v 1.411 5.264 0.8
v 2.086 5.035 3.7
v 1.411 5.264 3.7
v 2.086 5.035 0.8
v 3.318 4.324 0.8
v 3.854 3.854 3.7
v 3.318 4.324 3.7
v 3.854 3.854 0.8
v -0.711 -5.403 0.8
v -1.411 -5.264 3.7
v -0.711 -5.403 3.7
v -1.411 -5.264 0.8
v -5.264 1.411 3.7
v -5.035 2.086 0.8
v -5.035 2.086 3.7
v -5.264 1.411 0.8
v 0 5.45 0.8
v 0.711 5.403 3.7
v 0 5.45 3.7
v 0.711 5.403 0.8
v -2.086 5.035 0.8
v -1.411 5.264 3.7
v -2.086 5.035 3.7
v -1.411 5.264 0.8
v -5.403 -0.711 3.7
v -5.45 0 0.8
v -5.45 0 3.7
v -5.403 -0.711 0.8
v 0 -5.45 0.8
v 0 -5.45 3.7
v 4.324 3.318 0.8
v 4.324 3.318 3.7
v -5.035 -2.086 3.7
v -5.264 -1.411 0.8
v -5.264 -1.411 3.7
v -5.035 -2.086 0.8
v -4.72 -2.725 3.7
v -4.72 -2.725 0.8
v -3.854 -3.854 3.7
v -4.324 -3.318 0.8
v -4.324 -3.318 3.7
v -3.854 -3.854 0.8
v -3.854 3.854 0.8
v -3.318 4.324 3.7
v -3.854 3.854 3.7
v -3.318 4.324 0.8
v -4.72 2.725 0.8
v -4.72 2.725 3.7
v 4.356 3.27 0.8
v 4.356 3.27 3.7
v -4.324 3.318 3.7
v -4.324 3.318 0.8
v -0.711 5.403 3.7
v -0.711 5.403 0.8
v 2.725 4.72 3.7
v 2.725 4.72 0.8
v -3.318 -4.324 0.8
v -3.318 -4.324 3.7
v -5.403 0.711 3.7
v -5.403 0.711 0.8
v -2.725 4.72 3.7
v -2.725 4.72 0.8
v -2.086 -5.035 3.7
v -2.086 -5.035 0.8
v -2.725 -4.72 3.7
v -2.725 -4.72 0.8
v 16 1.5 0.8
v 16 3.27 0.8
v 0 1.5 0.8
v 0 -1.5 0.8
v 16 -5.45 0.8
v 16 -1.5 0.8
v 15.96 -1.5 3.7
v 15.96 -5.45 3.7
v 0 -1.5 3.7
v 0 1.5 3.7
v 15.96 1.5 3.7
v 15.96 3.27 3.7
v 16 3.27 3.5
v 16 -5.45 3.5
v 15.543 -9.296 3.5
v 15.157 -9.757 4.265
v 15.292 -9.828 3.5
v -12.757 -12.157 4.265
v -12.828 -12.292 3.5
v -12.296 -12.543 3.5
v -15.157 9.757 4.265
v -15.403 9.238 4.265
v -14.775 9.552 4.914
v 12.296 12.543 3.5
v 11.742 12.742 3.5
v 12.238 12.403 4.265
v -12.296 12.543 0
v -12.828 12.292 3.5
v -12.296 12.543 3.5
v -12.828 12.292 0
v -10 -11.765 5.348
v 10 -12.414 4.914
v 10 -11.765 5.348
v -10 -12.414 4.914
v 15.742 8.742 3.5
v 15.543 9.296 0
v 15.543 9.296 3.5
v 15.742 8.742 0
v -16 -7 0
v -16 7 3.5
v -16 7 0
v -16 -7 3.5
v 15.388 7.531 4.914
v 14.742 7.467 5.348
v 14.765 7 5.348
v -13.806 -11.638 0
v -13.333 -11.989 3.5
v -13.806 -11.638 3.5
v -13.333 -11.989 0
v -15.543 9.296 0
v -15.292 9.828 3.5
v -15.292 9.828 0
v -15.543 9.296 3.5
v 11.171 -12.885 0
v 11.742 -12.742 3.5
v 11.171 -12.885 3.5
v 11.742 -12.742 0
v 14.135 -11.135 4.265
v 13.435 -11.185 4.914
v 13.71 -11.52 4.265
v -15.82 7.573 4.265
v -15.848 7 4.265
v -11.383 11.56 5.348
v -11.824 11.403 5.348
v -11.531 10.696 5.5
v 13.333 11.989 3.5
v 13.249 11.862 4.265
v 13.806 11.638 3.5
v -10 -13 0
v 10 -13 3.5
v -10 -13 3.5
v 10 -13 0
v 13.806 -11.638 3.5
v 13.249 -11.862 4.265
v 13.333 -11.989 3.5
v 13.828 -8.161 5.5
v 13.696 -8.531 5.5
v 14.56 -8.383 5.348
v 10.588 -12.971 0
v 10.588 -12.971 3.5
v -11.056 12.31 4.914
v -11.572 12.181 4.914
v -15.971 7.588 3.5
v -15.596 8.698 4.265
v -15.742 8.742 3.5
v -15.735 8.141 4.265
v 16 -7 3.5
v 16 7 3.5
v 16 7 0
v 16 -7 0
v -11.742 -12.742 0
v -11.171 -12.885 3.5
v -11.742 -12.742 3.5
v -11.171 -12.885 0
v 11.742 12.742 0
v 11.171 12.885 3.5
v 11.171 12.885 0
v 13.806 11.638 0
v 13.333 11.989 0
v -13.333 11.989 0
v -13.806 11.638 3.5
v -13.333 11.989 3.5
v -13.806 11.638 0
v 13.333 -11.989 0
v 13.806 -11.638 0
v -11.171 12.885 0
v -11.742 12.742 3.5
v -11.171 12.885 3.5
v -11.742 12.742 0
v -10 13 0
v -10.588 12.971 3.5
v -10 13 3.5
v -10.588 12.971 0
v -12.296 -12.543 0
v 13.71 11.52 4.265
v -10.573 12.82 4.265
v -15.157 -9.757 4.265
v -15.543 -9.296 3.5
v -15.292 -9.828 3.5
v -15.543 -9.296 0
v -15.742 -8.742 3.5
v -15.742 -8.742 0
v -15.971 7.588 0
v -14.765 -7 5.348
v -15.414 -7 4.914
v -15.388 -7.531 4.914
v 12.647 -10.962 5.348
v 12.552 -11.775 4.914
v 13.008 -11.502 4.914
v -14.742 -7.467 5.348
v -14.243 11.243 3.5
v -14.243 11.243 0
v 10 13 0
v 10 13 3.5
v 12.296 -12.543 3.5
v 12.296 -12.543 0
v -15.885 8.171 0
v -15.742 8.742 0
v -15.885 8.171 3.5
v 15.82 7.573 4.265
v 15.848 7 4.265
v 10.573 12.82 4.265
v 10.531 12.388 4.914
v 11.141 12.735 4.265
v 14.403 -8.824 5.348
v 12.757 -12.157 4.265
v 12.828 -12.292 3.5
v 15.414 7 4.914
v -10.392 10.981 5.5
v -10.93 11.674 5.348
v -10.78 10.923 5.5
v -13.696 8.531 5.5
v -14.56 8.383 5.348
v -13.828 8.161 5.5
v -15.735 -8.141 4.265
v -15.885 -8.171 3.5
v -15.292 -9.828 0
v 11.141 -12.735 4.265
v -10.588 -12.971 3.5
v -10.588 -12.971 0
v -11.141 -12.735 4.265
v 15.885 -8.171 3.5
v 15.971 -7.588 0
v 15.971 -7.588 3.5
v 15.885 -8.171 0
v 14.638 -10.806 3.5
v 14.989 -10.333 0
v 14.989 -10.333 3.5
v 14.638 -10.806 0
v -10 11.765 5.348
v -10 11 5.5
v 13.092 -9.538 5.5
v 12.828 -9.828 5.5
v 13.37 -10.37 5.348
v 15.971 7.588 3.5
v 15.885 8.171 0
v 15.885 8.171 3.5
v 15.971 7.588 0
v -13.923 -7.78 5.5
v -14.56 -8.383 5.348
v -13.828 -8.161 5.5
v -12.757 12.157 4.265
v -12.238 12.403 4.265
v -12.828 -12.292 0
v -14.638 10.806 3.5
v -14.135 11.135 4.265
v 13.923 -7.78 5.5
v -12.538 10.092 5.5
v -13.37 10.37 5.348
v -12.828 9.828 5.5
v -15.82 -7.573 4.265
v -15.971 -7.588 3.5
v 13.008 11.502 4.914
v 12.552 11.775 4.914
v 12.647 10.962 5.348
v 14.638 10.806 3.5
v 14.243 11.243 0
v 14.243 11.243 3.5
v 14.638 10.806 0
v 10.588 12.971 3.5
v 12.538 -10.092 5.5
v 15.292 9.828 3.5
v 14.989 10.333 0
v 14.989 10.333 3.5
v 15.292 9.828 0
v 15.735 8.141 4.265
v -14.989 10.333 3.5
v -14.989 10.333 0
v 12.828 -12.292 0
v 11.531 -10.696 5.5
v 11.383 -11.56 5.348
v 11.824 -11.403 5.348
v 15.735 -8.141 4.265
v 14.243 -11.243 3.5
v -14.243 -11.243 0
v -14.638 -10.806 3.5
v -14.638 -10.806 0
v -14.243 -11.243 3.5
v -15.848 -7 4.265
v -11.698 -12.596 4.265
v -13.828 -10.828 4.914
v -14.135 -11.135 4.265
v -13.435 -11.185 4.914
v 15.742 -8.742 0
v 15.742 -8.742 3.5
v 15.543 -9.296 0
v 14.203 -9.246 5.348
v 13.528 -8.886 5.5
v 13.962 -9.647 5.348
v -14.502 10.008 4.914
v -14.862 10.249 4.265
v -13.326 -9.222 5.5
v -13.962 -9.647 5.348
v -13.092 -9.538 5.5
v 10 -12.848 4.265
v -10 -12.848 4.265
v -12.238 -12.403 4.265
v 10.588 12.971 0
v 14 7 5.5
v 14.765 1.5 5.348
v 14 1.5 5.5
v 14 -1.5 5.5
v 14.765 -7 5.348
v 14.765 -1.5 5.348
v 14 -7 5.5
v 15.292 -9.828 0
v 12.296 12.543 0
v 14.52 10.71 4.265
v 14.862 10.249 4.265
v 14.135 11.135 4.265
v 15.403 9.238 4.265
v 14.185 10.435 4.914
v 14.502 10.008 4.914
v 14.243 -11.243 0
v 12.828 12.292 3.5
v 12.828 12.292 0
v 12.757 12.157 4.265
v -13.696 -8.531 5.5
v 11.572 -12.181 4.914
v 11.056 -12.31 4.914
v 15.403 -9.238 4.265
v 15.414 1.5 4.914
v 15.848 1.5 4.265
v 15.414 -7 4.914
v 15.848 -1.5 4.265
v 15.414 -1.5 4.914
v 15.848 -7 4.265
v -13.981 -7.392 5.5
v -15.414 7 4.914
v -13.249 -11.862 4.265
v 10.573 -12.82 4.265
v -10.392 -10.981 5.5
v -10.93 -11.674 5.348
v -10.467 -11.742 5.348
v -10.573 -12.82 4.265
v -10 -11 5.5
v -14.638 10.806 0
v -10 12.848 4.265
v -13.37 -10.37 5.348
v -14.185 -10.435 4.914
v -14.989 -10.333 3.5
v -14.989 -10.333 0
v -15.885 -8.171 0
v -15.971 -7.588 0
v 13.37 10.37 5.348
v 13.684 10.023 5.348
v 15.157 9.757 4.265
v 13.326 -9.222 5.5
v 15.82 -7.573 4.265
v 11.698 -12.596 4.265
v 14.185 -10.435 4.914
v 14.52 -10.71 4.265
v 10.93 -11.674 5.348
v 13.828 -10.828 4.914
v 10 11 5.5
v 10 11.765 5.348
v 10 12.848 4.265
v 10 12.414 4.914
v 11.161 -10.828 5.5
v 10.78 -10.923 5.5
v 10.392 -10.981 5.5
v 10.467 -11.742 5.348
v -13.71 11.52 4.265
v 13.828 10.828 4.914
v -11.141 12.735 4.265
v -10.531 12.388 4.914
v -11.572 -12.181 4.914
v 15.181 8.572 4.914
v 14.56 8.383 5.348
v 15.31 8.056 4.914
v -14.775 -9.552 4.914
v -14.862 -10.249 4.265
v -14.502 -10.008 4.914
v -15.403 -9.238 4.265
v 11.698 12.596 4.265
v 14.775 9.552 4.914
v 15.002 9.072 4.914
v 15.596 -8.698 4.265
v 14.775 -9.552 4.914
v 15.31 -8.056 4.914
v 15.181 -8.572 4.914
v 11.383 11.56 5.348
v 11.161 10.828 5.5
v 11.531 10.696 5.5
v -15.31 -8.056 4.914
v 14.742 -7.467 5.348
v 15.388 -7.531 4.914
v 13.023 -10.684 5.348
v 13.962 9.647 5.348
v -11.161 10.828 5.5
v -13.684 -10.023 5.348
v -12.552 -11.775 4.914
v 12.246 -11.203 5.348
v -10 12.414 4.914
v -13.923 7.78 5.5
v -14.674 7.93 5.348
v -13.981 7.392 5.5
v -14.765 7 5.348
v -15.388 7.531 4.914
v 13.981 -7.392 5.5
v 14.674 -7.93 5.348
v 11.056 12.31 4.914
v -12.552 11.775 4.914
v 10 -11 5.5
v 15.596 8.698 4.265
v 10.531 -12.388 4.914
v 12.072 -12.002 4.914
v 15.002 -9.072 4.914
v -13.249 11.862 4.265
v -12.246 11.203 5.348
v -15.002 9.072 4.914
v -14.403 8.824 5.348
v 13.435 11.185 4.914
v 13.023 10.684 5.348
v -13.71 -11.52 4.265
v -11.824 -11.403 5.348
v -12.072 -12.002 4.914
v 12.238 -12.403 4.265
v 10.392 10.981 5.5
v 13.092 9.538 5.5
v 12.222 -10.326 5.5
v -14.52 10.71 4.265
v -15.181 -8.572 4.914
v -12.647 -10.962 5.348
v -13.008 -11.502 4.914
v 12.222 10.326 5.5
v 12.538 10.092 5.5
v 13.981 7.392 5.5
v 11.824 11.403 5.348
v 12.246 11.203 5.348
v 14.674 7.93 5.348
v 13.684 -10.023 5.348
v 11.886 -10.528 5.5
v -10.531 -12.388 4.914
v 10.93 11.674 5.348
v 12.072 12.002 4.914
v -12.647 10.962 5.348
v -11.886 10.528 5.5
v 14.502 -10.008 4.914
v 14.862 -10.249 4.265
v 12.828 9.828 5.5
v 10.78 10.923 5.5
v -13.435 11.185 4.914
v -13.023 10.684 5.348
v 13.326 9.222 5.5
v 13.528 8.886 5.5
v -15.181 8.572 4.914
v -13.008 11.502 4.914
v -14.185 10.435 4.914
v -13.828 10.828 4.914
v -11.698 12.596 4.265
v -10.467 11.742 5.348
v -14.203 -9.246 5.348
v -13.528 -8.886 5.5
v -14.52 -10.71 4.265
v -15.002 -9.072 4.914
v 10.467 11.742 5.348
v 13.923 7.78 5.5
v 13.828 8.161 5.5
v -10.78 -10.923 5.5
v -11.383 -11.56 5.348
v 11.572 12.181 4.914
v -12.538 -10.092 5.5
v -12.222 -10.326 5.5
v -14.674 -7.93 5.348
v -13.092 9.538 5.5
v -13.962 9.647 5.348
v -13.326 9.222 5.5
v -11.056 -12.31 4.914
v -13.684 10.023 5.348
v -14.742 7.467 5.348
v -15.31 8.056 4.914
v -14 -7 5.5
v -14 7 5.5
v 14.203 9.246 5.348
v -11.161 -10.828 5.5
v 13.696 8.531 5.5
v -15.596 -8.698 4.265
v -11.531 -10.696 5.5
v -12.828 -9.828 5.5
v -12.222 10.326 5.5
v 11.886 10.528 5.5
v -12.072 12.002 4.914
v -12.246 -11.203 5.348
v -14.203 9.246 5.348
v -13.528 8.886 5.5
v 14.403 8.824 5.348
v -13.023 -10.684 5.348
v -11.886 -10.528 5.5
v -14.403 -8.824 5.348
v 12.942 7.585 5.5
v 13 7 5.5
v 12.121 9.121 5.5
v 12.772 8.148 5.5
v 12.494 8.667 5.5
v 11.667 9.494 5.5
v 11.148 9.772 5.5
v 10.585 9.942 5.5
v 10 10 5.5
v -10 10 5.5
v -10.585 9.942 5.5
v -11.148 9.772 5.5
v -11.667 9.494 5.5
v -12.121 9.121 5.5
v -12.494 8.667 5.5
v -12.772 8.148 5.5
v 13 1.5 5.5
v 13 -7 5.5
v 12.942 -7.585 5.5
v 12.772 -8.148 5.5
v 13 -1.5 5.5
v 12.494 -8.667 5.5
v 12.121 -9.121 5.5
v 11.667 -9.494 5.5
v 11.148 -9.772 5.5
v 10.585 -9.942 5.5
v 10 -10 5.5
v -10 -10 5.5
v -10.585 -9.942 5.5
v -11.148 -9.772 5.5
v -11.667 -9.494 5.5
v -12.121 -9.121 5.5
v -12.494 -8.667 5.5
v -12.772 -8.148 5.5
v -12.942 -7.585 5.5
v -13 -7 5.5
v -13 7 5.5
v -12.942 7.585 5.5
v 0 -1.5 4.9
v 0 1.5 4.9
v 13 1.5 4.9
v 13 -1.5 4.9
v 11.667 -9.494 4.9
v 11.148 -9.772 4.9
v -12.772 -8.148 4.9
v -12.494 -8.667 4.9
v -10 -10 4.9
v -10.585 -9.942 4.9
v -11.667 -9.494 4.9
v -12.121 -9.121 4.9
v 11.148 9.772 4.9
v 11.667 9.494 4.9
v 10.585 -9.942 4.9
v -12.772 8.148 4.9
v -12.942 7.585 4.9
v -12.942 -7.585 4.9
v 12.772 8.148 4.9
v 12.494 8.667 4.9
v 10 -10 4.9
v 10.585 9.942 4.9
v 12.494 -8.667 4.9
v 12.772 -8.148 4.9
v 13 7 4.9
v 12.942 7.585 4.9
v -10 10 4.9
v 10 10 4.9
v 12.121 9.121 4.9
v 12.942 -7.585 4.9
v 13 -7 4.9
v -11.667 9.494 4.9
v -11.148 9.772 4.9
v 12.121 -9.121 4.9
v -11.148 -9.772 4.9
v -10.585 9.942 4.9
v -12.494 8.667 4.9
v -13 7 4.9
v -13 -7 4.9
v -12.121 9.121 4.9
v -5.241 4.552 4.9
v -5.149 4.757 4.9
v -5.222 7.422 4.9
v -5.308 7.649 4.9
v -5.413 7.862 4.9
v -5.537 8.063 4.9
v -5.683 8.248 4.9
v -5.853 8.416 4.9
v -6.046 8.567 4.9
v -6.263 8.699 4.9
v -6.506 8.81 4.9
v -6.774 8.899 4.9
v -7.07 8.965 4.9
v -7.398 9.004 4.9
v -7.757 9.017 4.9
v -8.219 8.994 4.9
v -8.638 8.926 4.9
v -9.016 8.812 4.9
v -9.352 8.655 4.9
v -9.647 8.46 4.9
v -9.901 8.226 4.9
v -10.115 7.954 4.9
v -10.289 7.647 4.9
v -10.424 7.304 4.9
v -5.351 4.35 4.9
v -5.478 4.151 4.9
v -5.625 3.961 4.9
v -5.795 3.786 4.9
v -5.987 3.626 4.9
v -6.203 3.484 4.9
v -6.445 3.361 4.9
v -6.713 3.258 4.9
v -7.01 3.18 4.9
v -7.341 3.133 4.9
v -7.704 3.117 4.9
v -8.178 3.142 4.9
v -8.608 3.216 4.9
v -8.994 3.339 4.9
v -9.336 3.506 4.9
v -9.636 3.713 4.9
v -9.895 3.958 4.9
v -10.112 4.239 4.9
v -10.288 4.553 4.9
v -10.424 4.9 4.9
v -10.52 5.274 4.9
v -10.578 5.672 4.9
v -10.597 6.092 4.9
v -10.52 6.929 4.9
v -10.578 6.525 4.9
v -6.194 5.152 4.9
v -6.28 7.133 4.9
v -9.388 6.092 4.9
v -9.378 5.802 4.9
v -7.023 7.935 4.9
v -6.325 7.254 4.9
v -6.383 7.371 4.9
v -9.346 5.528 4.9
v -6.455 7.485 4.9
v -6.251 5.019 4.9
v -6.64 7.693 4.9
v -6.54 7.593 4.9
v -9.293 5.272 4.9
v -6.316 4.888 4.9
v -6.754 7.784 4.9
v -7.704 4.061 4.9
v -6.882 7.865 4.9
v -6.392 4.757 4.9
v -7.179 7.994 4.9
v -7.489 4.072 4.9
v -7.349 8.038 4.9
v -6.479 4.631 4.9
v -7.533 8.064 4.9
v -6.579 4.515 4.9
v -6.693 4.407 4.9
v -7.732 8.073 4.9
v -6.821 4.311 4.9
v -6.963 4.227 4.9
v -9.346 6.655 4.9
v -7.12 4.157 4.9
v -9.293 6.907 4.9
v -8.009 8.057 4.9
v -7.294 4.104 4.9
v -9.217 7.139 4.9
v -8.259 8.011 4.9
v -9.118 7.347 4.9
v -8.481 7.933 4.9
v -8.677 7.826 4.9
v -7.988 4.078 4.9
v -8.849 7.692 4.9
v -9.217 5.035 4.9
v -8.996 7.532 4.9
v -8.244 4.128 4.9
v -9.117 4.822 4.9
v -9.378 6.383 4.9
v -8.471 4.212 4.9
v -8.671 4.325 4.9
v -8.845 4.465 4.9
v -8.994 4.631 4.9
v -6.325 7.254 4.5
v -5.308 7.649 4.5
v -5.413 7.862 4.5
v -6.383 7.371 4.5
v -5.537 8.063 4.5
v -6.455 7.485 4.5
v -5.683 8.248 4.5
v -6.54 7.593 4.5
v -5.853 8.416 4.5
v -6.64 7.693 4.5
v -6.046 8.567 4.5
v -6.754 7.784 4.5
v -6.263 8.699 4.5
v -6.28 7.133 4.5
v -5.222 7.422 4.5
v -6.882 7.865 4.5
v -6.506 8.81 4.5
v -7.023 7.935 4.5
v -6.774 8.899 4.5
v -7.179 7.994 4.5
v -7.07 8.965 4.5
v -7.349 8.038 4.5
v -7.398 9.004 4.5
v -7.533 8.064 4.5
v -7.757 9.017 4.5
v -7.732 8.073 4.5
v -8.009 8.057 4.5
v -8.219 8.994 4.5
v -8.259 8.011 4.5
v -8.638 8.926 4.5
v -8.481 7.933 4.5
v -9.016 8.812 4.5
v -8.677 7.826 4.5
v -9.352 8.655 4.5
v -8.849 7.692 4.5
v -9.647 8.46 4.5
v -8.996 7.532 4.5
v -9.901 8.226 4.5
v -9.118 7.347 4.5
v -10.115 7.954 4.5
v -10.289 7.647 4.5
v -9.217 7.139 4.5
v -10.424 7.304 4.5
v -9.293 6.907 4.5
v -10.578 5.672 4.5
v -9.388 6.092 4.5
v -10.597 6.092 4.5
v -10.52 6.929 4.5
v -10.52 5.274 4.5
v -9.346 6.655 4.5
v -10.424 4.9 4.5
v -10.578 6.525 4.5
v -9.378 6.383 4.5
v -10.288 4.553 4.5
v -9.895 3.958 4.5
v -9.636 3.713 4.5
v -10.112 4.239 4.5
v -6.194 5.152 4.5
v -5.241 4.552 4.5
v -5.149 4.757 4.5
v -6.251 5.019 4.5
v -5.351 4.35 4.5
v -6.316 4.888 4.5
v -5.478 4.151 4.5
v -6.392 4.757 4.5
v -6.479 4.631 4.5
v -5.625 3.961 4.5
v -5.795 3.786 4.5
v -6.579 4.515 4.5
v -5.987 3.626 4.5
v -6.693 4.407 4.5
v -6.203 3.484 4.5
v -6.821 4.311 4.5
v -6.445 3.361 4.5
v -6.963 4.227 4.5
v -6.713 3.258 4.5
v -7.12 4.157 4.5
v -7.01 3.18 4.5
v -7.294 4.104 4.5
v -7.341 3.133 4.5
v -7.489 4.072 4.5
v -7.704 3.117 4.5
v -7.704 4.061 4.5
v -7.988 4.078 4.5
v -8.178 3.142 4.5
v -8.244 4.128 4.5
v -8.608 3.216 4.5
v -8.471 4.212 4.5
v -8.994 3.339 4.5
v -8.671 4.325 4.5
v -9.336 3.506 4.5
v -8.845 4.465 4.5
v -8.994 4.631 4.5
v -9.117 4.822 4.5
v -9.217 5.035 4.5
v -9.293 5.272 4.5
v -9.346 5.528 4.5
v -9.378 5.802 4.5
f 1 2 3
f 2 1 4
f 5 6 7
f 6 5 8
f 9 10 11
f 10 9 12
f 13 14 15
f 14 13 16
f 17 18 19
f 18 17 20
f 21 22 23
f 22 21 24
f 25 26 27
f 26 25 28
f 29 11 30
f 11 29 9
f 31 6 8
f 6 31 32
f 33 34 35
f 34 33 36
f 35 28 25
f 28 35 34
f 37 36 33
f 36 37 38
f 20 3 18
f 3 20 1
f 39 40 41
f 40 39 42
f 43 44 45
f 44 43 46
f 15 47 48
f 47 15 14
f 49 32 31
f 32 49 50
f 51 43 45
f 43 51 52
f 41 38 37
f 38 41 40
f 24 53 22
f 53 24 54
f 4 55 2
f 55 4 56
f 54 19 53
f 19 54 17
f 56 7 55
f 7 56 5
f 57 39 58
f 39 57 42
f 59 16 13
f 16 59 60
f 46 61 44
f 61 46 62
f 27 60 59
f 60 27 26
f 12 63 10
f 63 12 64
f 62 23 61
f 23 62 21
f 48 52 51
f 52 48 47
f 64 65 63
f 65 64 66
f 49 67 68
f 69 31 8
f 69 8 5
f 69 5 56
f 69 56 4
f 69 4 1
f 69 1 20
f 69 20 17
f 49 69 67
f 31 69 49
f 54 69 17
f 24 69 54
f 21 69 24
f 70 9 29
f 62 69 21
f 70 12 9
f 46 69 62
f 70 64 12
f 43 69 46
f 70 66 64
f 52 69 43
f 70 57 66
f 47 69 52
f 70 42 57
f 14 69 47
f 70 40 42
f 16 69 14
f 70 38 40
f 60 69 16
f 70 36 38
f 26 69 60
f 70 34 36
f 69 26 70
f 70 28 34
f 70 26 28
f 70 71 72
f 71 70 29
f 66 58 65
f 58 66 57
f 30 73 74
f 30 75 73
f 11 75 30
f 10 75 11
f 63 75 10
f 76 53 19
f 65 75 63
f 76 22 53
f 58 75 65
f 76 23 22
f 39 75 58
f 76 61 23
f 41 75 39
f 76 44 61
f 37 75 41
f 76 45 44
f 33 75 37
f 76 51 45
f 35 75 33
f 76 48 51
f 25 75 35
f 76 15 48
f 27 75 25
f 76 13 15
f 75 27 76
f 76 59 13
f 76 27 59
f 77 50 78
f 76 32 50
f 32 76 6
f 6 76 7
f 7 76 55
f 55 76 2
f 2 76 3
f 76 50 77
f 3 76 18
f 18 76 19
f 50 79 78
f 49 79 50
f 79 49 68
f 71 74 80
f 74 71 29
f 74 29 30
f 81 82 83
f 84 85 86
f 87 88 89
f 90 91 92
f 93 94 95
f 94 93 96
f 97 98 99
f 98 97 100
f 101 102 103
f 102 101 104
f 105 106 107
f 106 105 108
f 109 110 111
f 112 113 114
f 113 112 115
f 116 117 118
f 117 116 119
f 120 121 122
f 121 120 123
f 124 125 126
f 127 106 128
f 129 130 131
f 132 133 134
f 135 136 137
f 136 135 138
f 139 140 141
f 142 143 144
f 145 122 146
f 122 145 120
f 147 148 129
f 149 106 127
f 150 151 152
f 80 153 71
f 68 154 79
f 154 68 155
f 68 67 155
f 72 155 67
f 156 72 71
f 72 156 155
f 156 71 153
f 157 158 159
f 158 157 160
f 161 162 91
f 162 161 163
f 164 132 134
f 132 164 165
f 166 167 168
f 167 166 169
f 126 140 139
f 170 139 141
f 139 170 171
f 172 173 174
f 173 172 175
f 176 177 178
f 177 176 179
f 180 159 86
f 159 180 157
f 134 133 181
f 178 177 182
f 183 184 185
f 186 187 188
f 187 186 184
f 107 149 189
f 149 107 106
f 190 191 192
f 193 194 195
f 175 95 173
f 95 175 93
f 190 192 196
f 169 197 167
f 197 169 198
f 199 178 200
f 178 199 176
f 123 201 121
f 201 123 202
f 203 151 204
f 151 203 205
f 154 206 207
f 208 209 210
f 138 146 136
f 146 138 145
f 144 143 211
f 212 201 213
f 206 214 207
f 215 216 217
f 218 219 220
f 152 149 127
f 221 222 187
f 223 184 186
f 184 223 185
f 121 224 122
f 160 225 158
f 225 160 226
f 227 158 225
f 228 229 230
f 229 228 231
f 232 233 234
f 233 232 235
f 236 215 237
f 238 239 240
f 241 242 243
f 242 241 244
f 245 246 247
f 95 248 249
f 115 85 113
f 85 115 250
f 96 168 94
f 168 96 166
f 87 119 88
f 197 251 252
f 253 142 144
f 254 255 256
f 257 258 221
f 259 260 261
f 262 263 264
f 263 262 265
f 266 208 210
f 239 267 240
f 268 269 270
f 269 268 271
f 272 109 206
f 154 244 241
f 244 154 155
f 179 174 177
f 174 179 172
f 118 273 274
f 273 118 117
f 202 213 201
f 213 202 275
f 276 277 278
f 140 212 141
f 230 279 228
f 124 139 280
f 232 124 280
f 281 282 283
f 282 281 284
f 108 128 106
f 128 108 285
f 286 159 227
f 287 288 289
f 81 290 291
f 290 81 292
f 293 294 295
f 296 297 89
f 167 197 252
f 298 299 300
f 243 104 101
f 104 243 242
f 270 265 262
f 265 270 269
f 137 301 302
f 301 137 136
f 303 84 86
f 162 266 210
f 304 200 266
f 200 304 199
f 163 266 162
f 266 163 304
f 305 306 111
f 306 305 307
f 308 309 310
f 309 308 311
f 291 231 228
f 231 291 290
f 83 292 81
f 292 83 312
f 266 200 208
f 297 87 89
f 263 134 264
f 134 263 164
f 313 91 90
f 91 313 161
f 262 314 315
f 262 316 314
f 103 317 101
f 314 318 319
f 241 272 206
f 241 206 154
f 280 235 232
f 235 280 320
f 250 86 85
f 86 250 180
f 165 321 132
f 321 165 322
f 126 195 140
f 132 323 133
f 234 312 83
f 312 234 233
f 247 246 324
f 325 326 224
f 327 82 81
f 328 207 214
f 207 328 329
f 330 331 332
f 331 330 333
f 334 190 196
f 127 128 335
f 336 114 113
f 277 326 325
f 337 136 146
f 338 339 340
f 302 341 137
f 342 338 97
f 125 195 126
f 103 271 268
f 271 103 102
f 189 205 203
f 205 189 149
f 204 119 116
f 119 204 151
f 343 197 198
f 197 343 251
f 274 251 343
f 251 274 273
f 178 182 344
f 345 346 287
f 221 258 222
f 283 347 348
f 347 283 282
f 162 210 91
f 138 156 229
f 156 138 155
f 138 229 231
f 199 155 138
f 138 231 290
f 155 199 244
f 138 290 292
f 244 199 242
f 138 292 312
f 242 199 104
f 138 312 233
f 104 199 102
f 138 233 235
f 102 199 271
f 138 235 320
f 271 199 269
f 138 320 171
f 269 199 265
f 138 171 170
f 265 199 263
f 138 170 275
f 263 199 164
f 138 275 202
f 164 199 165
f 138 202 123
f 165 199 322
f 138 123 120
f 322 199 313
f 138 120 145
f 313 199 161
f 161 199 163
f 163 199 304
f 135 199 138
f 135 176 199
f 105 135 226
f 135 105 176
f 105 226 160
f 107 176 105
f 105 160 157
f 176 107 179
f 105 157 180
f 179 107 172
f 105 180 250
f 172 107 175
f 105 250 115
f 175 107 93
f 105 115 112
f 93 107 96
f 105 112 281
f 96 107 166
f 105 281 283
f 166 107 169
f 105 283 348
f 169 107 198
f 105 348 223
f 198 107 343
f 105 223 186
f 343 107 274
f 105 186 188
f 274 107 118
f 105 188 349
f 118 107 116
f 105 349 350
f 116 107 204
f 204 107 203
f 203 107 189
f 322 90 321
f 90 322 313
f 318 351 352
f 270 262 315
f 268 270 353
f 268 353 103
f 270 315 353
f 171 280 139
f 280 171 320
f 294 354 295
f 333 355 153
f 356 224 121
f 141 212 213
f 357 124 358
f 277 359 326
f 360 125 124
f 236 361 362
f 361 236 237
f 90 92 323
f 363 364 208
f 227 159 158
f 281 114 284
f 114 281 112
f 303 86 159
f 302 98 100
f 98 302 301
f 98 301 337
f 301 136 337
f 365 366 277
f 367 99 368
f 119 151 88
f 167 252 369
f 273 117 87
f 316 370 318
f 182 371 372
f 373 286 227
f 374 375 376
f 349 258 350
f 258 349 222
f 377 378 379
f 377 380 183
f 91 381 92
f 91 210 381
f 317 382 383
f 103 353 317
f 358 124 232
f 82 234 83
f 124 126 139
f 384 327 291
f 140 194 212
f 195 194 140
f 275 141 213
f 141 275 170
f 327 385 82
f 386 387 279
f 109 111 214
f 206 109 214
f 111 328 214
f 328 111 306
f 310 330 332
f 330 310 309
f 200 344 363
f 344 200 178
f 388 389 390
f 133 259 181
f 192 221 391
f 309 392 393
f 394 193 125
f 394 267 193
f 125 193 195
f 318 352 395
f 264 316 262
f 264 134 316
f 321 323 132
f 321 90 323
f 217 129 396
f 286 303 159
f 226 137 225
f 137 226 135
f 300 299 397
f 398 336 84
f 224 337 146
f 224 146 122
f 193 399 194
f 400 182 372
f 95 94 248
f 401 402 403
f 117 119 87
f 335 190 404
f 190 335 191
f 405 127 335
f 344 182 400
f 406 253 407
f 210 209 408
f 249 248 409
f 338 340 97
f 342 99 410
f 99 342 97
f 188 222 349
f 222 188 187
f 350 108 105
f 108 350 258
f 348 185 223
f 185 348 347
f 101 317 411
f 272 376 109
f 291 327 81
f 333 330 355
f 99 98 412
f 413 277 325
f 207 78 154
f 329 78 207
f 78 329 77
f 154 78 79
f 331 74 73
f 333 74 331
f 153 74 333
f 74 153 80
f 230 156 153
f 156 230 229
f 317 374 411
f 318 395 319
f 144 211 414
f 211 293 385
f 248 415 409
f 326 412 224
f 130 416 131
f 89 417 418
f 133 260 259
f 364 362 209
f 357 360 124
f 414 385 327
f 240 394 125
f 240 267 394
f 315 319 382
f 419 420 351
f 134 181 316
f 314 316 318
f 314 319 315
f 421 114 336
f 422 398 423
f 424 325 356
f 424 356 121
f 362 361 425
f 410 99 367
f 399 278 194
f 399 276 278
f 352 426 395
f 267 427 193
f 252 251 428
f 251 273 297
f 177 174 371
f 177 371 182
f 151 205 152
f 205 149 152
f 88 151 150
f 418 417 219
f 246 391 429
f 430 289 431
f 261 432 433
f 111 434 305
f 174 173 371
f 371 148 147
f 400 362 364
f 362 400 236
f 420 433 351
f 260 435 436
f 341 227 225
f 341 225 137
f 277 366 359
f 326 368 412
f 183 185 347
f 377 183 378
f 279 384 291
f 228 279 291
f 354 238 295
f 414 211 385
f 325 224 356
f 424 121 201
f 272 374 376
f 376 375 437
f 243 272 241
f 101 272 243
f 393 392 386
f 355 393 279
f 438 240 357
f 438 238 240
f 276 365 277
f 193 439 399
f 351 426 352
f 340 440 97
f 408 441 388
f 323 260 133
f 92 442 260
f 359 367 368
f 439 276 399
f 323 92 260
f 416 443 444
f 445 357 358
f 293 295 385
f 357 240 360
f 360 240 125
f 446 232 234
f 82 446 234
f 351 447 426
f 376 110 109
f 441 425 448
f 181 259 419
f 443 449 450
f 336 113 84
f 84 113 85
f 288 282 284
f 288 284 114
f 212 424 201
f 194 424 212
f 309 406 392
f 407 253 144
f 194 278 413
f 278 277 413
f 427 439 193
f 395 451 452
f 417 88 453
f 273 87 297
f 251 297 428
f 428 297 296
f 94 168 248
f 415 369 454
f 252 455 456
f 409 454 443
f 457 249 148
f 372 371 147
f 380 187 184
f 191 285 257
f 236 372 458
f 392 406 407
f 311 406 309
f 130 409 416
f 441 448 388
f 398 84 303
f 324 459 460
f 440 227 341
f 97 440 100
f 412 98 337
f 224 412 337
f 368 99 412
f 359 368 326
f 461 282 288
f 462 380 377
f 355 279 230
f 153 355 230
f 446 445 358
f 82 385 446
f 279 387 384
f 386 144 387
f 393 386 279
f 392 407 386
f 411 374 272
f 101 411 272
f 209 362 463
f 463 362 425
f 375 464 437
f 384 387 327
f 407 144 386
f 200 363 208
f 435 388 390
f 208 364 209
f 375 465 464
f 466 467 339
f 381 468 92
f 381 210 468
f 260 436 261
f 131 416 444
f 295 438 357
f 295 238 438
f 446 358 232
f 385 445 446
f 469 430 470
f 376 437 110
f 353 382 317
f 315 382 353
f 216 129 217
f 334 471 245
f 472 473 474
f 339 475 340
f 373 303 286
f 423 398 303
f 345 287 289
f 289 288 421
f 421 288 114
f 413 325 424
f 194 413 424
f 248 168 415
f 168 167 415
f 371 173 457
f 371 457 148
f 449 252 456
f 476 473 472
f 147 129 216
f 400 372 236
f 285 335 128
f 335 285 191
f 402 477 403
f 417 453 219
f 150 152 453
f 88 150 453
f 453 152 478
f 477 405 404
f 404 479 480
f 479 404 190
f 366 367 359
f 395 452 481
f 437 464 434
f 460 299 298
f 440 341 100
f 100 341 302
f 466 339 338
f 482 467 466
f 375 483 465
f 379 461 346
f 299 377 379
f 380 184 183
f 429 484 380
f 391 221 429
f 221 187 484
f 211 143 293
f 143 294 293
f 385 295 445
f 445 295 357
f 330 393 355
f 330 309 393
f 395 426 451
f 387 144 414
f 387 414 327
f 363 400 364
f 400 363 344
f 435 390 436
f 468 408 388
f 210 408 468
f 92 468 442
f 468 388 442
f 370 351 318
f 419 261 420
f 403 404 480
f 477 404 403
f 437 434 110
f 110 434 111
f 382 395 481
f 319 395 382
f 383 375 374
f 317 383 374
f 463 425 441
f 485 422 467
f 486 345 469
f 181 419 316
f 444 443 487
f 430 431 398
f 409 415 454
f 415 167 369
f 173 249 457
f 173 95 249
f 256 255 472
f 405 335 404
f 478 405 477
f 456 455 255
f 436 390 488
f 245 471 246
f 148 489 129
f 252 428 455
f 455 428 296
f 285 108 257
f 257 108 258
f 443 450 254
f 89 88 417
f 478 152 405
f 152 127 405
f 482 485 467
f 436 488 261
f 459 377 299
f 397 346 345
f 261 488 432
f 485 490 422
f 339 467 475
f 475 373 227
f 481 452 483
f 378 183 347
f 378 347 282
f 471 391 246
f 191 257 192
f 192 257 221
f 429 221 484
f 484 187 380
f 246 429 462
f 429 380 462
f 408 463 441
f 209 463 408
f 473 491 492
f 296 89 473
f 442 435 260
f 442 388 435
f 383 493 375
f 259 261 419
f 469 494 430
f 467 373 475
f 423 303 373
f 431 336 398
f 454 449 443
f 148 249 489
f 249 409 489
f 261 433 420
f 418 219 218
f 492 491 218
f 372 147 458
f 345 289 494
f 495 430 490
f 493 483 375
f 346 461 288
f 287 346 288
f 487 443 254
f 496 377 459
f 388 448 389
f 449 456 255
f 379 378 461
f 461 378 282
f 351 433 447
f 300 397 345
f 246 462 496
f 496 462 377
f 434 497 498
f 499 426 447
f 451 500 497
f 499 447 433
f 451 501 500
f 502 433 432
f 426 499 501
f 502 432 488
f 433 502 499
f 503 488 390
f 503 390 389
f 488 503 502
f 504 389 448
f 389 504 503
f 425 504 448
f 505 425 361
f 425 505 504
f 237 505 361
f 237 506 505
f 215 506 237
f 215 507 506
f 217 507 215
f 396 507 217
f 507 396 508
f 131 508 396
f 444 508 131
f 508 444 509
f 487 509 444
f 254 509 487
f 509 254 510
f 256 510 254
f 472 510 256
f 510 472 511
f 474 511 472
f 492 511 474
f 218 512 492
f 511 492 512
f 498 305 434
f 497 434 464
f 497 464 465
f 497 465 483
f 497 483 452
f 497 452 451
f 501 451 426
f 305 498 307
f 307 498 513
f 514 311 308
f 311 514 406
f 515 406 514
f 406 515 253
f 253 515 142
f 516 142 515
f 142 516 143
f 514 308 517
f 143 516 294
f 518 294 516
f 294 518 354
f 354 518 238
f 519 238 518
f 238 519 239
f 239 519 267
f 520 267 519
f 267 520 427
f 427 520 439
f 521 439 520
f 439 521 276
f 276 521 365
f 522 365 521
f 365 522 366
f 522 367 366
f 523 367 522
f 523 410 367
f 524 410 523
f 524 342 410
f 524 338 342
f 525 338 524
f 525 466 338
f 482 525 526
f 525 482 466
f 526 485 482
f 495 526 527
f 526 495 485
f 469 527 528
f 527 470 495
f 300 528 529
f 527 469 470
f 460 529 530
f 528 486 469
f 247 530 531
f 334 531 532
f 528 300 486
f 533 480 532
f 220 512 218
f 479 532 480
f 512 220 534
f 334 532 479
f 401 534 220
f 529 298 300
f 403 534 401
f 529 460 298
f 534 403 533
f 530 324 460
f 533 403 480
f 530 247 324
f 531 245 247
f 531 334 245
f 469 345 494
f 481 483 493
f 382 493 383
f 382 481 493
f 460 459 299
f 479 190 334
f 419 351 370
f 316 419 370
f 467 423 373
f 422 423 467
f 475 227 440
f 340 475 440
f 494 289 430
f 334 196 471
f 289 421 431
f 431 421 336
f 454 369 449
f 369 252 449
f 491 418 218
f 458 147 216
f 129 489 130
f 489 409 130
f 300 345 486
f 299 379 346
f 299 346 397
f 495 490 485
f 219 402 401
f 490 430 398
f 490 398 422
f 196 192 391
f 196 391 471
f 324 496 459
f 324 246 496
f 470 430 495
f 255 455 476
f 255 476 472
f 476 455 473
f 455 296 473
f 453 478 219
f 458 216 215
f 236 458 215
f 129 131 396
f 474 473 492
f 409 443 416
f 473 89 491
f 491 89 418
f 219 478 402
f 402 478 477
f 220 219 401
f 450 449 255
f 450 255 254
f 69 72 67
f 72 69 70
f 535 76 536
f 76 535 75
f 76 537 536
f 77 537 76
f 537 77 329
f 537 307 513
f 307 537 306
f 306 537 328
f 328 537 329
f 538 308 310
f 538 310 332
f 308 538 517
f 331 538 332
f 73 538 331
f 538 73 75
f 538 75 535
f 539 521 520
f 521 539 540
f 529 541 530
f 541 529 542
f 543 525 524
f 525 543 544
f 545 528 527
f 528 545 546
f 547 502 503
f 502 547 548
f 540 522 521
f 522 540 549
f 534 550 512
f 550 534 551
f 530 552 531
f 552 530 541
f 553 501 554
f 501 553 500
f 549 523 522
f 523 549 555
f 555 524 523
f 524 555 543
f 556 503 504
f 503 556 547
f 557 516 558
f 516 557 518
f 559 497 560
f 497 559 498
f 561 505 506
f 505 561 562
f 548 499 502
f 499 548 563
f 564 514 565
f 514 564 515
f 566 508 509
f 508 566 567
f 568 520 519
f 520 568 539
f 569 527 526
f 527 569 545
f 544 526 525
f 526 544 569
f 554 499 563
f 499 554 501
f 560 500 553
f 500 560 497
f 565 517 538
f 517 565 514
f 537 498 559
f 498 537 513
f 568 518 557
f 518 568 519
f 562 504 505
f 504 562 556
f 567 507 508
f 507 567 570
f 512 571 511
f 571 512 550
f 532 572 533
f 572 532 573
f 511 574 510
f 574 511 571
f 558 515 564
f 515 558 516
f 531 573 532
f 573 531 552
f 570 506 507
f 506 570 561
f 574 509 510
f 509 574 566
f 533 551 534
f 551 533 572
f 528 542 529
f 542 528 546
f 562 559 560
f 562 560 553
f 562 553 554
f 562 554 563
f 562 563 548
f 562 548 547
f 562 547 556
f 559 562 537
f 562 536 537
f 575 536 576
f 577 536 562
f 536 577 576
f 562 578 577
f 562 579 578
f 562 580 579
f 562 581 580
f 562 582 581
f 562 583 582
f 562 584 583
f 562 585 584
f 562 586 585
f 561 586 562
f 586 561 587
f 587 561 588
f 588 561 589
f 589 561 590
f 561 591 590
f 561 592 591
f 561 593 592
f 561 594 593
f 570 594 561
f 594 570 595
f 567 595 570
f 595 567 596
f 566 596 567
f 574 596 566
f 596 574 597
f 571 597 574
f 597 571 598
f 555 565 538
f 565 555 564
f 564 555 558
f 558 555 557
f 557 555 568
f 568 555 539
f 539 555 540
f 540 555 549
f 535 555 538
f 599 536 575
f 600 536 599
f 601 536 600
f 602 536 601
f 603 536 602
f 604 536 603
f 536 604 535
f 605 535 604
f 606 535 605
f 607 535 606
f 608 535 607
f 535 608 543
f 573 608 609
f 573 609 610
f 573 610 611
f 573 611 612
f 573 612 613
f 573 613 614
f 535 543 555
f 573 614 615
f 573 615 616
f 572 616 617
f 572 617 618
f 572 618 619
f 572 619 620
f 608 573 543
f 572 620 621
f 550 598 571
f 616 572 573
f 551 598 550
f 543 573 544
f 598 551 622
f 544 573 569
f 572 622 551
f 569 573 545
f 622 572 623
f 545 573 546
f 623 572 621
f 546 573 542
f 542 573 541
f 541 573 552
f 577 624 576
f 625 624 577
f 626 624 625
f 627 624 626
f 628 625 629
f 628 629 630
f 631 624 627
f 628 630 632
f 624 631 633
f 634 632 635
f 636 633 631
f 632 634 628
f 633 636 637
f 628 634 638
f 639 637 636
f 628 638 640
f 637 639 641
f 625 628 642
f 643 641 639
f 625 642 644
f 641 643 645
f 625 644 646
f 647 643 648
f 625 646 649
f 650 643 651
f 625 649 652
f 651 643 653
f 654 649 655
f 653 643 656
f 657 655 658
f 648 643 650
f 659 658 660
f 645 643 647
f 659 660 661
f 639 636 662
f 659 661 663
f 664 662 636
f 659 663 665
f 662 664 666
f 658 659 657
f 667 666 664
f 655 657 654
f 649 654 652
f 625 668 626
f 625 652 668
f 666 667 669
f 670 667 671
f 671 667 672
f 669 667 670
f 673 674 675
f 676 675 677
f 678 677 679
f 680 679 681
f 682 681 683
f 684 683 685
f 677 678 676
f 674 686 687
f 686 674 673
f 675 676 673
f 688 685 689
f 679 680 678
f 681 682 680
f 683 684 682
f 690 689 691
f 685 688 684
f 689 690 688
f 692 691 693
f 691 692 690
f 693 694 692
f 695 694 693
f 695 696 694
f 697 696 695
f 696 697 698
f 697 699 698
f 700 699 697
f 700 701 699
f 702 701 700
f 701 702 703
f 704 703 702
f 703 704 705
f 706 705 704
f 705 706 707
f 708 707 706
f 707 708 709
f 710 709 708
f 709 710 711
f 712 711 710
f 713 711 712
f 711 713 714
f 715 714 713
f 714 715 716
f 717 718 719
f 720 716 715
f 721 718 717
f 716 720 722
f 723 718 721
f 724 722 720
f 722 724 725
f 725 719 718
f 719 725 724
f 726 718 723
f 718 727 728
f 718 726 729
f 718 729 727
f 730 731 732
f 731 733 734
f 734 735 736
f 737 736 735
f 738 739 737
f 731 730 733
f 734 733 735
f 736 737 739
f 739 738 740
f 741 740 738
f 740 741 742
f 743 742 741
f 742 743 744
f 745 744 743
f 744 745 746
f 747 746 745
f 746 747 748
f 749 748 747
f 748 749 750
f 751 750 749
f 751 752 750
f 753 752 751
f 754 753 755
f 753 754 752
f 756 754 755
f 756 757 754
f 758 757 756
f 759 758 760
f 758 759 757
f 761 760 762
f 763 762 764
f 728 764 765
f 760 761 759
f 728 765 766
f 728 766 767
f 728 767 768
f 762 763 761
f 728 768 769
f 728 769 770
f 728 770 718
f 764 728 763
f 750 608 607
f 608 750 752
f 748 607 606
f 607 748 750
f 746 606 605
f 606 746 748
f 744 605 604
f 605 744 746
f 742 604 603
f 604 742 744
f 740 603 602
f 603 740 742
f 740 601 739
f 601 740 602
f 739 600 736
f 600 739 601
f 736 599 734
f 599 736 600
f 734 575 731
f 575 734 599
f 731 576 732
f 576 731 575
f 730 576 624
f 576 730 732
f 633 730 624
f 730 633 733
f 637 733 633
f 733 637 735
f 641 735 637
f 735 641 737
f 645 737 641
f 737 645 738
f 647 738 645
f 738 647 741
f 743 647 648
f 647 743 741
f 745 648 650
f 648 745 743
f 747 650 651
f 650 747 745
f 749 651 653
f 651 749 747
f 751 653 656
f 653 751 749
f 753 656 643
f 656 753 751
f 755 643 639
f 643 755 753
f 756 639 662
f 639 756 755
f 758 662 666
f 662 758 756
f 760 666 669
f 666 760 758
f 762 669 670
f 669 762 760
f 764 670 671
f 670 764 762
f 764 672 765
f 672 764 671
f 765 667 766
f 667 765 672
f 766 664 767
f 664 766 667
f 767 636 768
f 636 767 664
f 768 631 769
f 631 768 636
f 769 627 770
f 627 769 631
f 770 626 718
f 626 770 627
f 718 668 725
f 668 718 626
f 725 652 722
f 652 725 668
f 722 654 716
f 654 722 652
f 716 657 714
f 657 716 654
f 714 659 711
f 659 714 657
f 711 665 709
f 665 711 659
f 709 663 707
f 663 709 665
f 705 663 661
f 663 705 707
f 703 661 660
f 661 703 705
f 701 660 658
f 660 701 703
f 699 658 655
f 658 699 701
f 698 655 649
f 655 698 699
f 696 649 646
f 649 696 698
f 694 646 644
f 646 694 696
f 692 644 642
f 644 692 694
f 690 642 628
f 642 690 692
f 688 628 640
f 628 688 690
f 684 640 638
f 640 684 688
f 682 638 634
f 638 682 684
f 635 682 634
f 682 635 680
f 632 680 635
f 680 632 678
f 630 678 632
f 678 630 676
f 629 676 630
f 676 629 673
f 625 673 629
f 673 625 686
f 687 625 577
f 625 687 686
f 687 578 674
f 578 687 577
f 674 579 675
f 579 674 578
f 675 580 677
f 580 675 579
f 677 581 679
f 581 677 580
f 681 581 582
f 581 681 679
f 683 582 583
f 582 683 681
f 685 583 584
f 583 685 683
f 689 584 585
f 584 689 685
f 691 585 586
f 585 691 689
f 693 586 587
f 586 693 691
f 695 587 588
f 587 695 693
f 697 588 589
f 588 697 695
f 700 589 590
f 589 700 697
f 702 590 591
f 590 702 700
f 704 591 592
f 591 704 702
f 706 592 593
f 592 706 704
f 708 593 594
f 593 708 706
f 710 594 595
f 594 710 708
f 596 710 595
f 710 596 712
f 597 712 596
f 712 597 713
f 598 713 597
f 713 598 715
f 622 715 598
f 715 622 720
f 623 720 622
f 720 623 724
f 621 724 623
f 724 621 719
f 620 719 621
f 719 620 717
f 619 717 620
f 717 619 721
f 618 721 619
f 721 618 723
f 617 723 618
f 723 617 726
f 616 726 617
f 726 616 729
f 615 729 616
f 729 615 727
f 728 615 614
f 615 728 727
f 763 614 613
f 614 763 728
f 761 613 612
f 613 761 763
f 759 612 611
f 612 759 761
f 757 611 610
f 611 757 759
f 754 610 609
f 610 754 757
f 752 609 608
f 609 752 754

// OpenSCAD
// SPDX-License-Identifier: CERN-OHL-P-2.0
// Copyright 2026 CLSOFTLAB (씨엘소프트랩), Dr. Lee Il-guk (이일국)
// Open Walking Safety Helmet (OWSH) - haptic_pad (spec §10, §4.3): TPU pad holding one coin
// ERM motor (type 1027, 10 x 2.7 mm). Qty 3: left temple (M1), forehead centre (M2), right
// temple (M3). Hook tape goes in the recess on the back; it grips the helmet comfort padding.
// Never glue anything to the EPS liner (P1).
// Print: TPU 95A, skin side (thin membrane) on the bed (as exported), no supports.

include <lib/owsh_common.scad>

// ----------------------------------------------------------------- parameters
motor_d      = 10.0;   // verify with calipers
motor_t      = 2.7;
pad_size     = [32, 26];
membrane_t   = 0.8;    // between motor and head: thin for a crisp vibration
roof_t       = 1.2;
velcro_recess = [26, 20, 0.6];
lead_channel = [3.0, 1.8];
pad_letter   = "C";    // "L", "C" or "R" - debossed in the velcro recess

pocket_d = motor_d + 2 * clr + 0.3;
pocket_h = motor_t + 0.2;
pad_t = membrane_t + pocket_h + roof_t + velcro_recess[2];

module haptic_pad(letter = pad_letter) {
    difference() {
        rounded_box([pad_size[0], pad_size[1], pad_t], r = 2, r_plan = 6);
        // motor pocket + side insertion slot + lead channel to the edge
        translate([0, 0, membrane_t]) {
            cylinder(d = pocket_d, h = pocket_h, $fn = 48);
            translate([0, -pocket_d / 2, 0]) cube([pad_size[0], pocket_d * 0.8, pocket_h]);
        }
        translate([0, -lead_channel[0] / 2, membrane_t]) cube([pad_size[0], lead_channel[0], lead_channel[1] + pocket_h]);
        // velcro recess on the back
        translate([0, 0, pad_t - velcro_recess[2]]) linear_extrude(1) rounded_rect2d([velcro_recess[0], velcro_recess[1]], 3);
        translate([-8, 6, pad_t - velcro_recess[2] - 0.4]) label_text(letter, 6, 1);
    }
}

haptic_pad();
